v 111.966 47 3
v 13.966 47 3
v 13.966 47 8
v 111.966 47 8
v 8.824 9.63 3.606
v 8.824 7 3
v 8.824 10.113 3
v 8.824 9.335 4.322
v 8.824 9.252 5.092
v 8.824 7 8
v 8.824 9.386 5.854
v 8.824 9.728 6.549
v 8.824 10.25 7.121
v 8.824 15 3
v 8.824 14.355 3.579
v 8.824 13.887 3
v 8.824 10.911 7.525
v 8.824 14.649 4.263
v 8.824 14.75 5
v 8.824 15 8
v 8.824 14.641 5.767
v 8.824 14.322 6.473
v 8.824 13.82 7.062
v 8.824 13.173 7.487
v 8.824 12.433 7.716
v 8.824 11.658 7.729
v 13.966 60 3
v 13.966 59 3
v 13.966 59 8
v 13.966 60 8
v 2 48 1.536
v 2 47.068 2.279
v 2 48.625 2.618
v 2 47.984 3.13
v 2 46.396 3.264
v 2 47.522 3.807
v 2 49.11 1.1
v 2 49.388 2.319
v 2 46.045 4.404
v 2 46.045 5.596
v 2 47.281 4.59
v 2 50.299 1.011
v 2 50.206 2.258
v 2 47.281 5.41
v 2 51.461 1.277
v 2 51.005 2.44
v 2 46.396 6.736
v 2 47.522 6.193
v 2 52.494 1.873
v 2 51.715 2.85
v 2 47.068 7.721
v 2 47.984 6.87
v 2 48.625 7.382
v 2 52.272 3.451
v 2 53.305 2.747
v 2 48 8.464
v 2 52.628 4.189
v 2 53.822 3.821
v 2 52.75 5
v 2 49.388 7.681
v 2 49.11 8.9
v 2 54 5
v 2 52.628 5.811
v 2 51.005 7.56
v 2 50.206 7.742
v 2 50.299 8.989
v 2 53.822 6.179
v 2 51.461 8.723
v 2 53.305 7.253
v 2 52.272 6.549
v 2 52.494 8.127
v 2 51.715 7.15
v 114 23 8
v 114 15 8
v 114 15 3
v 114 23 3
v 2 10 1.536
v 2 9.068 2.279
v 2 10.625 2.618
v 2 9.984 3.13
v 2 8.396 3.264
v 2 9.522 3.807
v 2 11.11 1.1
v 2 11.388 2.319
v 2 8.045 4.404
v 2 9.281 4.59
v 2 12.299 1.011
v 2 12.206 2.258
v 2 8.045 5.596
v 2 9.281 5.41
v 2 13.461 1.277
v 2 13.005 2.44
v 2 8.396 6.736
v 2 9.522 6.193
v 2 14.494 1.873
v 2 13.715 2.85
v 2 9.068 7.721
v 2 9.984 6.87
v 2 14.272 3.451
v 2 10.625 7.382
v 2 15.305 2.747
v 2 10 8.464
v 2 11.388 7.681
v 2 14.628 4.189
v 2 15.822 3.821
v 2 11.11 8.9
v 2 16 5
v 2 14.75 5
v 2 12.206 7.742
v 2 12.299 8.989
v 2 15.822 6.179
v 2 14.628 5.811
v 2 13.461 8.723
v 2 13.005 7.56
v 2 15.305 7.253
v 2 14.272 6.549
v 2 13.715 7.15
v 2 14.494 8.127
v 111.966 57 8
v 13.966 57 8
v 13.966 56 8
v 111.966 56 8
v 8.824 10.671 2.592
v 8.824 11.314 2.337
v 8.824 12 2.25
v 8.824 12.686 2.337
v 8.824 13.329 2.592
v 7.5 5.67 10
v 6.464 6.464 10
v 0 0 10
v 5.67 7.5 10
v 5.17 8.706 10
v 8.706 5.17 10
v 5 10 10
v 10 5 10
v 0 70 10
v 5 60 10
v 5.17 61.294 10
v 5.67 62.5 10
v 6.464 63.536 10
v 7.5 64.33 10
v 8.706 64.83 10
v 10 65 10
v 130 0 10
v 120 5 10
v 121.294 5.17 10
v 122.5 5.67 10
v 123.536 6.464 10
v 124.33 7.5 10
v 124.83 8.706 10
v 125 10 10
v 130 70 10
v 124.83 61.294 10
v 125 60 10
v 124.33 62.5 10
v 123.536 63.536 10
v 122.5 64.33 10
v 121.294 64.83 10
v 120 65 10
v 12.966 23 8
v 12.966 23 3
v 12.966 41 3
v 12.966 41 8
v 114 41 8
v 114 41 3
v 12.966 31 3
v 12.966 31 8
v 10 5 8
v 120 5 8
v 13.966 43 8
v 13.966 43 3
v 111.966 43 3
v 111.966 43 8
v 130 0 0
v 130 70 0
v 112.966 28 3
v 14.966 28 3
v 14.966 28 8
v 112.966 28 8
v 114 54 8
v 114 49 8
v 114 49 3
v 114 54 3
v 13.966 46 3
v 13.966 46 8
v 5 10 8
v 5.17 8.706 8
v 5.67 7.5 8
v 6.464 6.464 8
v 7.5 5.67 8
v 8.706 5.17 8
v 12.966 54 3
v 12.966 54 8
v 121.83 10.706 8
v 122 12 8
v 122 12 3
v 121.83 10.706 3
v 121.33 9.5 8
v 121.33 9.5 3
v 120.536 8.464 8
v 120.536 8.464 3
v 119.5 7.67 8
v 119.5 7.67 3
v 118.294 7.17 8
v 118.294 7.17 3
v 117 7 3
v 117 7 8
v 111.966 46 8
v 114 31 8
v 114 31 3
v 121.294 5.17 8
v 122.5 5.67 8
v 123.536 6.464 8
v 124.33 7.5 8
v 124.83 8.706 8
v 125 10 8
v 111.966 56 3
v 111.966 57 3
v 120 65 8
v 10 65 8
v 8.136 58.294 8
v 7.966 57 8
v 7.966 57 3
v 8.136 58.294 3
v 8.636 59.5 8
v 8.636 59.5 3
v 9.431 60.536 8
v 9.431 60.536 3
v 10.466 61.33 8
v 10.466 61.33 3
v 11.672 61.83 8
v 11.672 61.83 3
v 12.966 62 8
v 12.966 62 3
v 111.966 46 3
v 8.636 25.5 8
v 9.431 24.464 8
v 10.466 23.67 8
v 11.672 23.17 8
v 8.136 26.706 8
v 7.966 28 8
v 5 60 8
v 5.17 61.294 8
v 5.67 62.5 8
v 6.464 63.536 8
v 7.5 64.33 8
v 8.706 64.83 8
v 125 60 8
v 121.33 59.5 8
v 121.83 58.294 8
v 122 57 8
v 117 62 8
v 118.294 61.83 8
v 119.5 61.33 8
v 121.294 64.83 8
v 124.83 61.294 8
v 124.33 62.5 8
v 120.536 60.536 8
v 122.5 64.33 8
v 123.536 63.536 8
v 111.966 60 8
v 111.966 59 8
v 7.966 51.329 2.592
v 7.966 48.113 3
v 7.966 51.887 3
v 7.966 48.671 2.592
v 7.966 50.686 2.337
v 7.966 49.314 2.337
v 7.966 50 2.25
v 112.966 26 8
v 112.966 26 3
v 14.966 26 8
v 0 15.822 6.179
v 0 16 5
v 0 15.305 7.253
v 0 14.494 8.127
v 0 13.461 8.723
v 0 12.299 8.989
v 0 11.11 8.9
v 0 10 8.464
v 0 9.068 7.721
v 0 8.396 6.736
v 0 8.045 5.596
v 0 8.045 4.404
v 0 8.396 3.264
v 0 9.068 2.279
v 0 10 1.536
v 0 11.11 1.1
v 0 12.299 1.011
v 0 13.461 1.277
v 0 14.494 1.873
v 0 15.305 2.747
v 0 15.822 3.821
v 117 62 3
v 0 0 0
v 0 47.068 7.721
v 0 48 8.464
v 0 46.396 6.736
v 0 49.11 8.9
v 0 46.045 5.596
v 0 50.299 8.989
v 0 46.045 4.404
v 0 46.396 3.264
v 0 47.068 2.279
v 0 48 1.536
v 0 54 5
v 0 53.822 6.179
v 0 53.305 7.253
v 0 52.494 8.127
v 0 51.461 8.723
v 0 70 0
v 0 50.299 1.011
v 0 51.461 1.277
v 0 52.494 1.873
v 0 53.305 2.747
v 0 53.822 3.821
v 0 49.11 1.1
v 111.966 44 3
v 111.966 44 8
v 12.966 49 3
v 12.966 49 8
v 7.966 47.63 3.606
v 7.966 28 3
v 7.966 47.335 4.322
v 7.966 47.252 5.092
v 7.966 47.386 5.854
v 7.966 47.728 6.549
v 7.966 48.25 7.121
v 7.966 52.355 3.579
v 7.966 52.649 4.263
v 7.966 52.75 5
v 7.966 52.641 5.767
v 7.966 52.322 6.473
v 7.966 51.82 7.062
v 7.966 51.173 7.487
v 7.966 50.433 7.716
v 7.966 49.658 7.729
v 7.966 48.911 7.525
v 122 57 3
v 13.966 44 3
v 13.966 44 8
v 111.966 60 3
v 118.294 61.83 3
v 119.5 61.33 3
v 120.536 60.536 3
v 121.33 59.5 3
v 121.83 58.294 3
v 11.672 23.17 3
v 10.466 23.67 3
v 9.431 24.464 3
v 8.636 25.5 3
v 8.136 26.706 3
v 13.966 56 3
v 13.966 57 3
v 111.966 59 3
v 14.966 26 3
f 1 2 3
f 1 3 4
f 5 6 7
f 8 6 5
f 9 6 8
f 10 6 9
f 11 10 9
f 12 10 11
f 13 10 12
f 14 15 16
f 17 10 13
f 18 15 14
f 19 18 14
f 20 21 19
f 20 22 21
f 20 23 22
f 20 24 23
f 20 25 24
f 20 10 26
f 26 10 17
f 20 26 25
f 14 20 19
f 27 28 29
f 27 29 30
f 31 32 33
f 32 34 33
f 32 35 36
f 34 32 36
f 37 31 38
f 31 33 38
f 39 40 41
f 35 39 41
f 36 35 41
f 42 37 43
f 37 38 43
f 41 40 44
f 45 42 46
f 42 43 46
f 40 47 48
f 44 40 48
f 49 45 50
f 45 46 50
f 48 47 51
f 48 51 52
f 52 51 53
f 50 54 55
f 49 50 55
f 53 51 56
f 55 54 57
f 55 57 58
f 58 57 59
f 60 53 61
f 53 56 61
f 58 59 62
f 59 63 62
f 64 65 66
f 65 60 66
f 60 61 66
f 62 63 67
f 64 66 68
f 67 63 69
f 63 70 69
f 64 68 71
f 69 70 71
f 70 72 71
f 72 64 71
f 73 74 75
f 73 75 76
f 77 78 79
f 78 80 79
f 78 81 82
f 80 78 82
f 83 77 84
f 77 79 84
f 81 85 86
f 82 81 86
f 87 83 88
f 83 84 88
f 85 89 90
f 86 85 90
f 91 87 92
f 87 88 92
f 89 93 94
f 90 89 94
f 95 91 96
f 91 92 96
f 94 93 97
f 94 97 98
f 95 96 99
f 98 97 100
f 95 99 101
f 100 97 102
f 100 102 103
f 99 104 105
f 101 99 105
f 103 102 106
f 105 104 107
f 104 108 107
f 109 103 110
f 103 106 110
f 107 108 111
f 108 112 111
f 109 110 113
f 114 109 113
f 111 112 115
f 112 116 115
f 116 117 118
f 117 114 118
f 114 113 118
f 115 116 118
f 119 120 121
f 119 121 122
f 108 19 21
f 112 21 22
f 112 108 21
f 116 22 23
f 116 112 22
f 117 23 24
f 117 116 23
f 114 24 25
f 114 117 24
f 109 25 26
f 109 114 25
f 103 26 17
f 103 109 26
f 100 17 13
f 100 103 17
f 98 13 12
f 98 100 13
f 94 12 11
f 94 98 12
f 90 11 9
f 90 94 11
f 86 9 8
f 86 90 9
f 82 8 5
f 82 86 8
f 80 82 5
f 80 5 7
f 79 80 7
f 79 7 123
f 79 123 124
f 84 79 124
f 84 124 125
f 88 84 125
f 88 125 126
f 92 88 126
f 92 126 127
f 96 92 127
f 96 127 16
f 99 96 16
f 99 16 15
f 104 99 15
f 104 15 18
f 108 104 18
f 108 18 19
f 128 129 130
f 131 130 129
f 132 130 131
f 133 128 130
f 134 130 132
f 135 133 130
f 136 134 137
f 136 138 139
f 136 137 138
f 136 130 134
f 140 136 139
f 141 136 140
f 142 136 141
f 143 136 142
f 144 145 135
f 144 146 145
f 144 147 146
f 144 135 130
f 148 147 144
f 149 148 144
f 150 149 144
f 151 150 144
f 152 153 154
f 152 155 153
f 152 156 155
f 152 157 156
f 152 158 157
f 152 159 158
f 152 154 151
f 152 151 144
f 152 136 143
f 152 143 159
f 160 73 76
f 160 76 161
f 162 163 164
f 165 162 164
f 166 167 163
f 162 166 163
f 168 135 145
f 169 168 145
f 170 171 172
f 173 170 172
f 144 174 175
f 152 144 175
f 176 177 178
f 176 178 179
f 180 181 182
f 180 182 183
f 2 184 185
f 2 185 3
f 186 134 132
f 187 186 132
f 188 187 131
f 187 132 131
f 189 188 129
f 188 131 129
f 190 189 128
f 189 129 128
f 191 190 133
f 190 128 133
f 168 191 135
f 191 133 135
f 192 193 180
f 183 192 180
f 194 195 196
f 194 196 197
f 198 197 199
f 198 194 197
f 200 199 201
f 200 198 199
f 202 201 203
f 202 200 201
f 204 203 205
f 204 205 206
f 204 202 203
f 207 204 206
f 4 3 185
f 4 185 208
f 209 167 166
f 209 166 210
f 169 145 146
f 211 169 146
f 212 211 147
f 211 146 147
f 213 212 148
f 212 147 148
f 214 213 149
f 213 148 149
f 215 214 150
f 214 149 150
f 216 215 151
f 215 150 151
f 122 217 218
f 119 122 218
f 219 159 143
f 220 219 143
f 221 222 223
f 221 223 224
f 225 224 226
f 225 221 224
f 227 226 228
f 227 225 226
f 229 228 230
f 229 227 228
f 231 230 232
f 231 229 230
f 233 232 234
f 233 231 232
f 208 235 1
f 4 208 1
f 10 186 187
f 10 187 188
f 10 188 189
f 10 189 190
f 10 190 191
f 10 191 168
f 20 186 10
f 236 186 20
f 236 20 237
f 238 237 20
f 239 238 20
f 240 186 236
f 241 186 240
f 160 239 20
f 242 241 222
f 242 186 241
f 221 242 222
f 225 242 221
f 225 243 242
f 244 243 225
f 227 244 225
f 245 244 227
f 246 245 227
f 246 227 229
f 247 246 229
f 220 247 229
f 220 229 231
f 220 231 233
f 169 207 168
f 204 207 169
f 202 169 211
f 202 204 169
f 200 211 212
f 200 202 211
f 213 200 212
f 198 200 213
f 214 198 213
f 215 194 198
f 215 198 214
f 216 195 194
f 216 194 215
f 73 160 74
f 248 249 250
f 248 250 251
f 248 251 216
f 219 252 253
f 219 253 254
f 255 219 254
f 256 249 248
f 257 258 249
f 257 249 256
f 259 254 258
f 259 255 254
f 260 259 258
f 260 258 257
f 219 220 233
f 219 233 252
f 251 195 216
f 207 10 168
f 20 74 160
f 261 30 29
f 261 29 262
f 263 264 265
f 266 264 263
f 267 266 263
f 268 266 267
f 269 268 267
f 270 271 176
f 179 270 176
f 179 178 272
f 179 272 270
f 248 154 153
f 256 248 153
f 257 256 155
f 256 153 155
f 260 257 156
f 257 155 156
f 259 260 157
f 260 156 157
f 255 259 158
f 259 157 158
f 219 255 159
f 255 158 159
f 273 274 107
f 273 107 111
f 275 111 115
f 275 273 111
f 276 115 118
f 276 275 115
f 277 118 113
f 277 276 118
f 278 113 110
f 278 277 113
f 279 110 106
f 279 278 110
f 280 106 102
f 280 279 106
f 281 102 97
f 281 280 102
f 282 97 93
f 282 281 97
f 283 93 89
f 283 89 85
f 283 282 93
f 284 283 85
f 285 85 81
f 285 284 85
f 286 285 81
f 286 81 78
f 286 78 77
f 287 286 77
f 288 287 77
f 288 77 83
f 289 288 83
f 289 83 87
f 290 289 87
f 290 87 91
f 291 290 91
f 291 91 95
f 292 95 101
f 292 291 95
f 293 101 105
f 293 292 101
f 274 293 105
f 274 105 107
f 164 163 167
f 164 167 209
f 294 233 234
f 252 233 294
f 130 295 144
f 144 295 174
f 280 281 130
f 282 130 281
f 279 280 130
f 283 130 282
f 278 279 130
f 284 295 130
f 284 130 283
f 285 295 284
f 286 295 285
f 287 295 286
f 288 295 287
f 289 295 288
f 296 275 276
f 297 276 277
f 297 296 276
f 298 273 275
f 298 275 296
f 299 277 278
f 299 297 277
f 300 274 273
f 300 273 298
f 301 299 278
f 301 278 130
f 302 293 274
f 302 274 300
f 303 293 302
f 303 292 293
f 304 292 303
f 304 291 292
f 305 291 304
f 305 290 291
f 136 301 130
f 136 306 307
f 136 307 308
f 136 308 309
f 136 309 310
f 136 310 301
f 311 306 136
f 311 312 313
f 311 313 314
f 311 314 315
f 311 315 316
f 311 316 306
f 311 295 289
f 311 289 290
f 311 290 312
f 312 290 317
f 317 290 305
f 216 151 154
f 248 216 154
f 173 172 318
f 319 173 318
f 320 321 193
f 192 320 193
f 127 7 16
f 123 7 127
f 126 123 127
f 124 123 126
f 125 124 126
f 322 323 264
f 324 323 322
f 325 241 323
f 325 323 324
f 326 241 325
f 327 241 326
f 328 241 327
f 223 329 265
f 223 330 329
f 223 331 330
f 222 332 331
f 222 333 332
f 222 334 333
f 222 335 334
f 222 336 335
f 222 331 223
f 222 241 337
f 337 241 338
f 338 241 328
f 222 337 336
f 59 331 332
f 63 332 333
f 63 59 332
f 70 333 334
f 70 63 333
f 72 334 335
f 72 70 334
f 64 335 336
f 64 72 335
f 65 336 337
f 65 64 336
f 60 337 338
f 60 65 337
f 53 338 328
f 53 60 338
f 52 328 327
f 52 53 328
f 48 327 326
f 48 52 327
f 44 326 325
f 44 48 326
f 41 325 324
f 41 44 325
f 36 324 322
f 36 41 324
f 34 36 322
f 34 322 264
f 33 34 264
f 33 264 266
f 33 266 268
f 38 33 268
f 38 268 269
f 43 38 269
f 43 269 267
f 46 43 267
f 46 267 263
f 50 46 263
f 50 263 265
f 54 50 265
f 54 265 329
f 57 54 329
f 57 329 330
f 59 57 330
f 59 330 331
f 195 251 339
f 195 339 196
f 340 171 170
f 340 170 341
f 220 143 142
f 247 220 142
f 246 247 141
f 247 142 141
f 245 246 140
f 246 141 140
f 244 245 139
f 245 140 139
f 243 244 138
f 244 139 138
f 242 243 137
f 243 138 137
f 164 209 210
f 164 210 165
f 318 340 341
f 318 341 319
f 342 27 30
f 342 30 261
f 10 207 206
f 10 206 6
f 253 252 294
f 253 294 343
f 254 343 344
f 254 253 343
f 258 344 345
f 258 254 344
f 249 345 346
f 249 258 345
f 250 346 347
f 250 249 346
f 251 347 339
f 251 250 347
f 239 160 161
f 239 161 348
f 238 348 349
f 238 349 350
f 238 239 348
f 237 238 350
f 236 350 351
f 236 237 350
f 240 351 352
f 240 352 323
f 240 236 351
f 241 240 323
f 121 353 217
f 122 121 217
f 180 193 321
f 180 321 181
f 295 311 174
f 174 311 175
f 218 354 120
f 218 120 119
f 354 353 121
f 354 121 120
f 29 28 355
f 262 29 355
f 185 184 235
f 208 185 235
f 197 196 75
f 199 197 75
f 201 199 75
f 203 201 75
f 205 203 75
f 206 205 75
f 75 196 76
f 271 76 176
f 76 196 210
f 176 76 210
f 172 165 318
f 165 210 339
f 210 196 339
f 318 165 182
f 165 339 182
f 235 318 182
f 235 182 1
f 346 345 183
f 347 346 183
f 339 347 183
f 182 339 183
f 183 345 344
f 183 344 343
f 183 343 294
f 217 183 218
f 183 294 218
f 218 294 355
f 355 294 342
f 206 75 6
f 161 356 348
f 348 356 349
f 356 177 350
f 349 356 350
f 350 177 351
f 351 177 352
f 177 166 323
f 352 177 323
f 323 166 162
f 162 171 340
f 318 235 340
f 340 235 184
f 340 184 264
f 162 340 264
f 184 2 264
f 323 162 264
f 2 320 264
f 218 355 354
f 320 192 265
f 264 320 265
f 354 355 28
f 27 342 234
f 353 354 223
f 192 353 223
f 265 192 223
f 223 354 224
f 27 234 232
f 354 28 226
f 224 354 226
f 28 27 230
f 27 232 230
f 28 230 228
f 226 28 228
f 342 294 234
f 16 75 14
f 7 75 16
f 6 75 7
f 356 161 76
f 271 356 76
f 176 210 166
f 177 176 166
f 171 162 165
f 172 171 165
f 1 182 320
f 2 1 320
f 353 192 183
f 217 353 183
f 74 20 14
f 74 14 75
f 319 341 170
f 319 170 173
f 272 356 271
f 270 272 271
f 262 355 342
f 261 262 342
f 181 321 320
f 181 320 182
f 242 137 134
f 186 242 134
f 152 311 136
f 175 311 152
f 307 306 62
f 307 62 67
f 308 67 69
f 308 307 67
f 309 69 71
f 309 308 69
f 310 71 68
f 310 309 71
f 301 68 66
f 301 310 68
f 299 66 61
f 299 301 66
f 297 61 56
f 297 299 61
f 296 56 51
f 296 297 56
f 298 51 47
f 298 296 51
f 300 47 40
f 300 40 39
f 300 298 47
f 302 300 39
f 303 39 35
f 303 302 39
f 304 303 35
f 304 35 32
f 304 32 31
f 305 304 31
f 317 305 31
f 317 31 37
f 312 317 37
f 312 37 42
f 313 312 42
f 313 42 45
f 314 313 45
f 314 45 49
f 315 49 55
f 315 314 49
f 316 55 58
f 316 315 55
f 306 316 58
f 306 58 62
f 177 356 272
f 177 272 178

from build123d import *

# Parameters (mm, degrees)
ESQUISSE1_W                                 = 130
ESQUISSE1_H                                 = 70
BOSS_EXTRU_1_DEPTH                          = 10
ENL_V_MAT_EXTRU_1_DEPTH                     = 2
ESQUISSE20_W                                = 101.033933646
ESQUISSE20_H                                = 5
ESQUISSE20_H_2                              = 10
ENL_V_MAT_EXTRU_3_DEPTH                     = 5
CHAMBRAGE_POUR_VIS_SIX_PANS_CREUX_2_R       = 2.75
CHAMBRAGE_POUR_VIS_SIX_PANS_CREUX_M52_DEPTH = 7.966066354
CHAMBRAGE_POUR_VIS_SIX_PANS_CREUX_3_OU_R    = 4
CHAMBRAGE_POUR_VIS_SIX_PANS_CREUX_3_OU_R_2  = 2.75
CHAMBRAGE_POUR_VIS_SIX_PANS_CREUX_3_DEPTH   = 2
CHAMBRAGE_START                             = 7.966066354
CHAMBRAGE_POUR_VIS_SIX_PANS_CREUX_4_OU_R    = 2.75
CHAMBRAGE_POUR_VIS_SIX_PANS_CREUX_4_DEPTH   = 0.858319246
ESQUISSE23_W                                = 98
ESQUISSE23_H                                = 1
ESQUISSE23_H_2                              = 2
BOSS_EXTRU_2_DEPTH                          = 5


# Read off the part's stored shape, not the designer's step: Chambrage pour vis à six pans creux M52
with BuildPart() as part:
    # Esquisse1 → Boss.-Extru.1 (new body)
    with BuildSketch(Plane.XY):
        with Locations((65, 35)):
            Rectangle(ESQUISSE1_W, ESQUISSE1_H)
    extrude(amount=BOSS_EXTRU_1_DEPTH)

    # Esquisse18 → Enlèv. mat.-Extru.1 (cut)
    with BuildSketch(Plane.XY.offset(10)):
        with BuildLine():
            Line((10, 5), (120, 5))
            ThreePointArc((120, 5), (123.535533906, 6.464466094), (125, 10))
            Line((125, 10), (125, 60))
            ThreePointArc((125, 60), (123.535533906, 63.535533906), (120, 65))
            Line((120, 65), (10, 65))
            ThreePointArc((10, 65), (6.464466094, 63.535533906), (5, 60))
            Line((5, 60), (5, 10))
            ThreePointArc((5, 10), (6.464466094, 6.464466094), (10, 5))
        make_face()
    extrude(amount=-ENL_V_MAT_EXTRU_1_DEPTH, mode=Mode.SUBTRACT)

    # Esquisse20 → Enlèv. mat.-Extru.3 (cut)
    with BuildSketch(Plane.XY.offset(8)):
        with BuildLine():
            Line((12.966066354, 62), (117, 62))
            ThreePointArc((117, 62), (120.535533906, 60.535533906), (122, 57))
            Line((122, 57), (122, 12))
            ThreePointArc((122, 12), (120.535533906, 8.464466094), (117, 7))
            Line((117, 7), (8.8243856, 7))
            Line((8.8243856, 7), (8.8243856, 15))
            Line((8.8243856, 15), (114, 15))
            Line((114, 15), (114, 23))
            Line((114, 23), (12.966066354, 23))
            ThreePointArc((12.966066354, 23), (9.430532448, 24.464466094), (7.966066354, 28))
            Line((7.966066354, 28), (7.966066354, 57))
            ThreePointArc((7.966066354, 57), (9.430532448, 60.535533906), (12.966066354, 62))
        make_face()
        with Locations((63.483033177, 51.5)):
            Rectangle(ESQUISSE20_W, ESQUISSE20_H, mode=Mode.SUBTRACT)
        with Locations((63.483033177, 36)):
            Rectangle(ESQUISSE20_W, ESQUISSE20_H_2, mode=Mode.SUBTRACT)
    extrude(amount=-ENL_V_MAT_EXTRU_3_DEPTH, mode=Mode.SUBTRACT)

    # Chambrage pour vis _ six pans creux  2 → Chambrage pour vis à six pans creux M52 (cut)
    with BuildSketch(Plane.YZ):
        with Locations((12, 5)):
            Circle(CHAMBRAGE_POUR_VIS_SIX_PANS_CREUX_2_R)
        with Locations((50, 5)):
            Circle(CHAMBRAGE_POUR_VIS_SIX_PANS_CREUX_2_R)
    extrude(amount=CHAMBRAGE_POUR_VIS_SIX_PANS_CREUX_M52_DEPTH, mode=Mode.SUBTRACT)

    # Chambrage pour vis _ six pans creux 3 ou → Chambrage pour vis _ six pans creux  3 (cut)
    # profile 1 of 2: a face of its own
    with BuildSketch(Plane.YZ):
        with Locations((12, 5)):
            Circle(CHAMBRAGE_POUR_VIS_SIX_PANS_CREUX_3_OU_R)
        with Locations((12, 5)):
            Circle(CHAMBRAGE_POUR_VIS_SIX_PANS_CREUX_3_OU_R_2, mode=Mode.SUBTRACT)
    # profile 2 of 2: a face of its own
    with BuildSketch(Plane.YZ):
        with Locations((50, 5)):
            Circle(CHAMBRAGE_POUR_VIS_SIX_PANS_CREUX_3_OU_R)
        with Locations((50, 5)):
            Circle(CHAMBRAGE_POUR_VIS_SIX_PANS_CREUX_3_OU_R_2, mode=Mode.SUBTRACT)
    extrude(amount=CHAMBRAGE_POUR_VIS_SIX_PANS_CREUX_3_DEPTH, mode=Mode.SUBTRACT)

    # Chambrage pour vis _ six pans creux 4 ou → Chambrage pour vis _ six pans creux  4 (cut)
    with BuildSketch(Plane.YZ.offset(CHAMBRAGE_START)):
        with Locations((12, 5)):
            Circle(CHAMBRAGE_POUR_VIS_SIX_PANS_CREUX_4_OU_R)
    extrude(amount=CHAMBRAGE_POUR_VIS_SIX_PANS_CREUX_4_DEPTH, mode=Mode.SUBTRACT)

    # Esquisse23 → Boss.-Extru.2 (add)
    with BuildSketch(Plane.XY.offset(3)):
        with Locations((62.966066354, 59.5)):
            Rectangle(ESQUISSE23_W, ESQUISSE23_H)
        with Locations((62.966066354, 56.5)):
            Rectangle(ESQUISSE23_W, ESQUISSE23_H)
        with Locations((62.966066354, 46.5)):
            Rectangle(ESQUISSE23_W, ESQUISSE23_H)
        with Locations((62.966066354, 43.5)):
            Rectangle(ESQUISSE23_W, ESQUISSE23_H)
        with Locations((63.966066354, 27)):
            Rectangle(ESQUISSE23_W, ESQUISSE23_H_2)
    extrude(amount=BOSS_EXTRU_2_DEPTH)


solid = part.part
